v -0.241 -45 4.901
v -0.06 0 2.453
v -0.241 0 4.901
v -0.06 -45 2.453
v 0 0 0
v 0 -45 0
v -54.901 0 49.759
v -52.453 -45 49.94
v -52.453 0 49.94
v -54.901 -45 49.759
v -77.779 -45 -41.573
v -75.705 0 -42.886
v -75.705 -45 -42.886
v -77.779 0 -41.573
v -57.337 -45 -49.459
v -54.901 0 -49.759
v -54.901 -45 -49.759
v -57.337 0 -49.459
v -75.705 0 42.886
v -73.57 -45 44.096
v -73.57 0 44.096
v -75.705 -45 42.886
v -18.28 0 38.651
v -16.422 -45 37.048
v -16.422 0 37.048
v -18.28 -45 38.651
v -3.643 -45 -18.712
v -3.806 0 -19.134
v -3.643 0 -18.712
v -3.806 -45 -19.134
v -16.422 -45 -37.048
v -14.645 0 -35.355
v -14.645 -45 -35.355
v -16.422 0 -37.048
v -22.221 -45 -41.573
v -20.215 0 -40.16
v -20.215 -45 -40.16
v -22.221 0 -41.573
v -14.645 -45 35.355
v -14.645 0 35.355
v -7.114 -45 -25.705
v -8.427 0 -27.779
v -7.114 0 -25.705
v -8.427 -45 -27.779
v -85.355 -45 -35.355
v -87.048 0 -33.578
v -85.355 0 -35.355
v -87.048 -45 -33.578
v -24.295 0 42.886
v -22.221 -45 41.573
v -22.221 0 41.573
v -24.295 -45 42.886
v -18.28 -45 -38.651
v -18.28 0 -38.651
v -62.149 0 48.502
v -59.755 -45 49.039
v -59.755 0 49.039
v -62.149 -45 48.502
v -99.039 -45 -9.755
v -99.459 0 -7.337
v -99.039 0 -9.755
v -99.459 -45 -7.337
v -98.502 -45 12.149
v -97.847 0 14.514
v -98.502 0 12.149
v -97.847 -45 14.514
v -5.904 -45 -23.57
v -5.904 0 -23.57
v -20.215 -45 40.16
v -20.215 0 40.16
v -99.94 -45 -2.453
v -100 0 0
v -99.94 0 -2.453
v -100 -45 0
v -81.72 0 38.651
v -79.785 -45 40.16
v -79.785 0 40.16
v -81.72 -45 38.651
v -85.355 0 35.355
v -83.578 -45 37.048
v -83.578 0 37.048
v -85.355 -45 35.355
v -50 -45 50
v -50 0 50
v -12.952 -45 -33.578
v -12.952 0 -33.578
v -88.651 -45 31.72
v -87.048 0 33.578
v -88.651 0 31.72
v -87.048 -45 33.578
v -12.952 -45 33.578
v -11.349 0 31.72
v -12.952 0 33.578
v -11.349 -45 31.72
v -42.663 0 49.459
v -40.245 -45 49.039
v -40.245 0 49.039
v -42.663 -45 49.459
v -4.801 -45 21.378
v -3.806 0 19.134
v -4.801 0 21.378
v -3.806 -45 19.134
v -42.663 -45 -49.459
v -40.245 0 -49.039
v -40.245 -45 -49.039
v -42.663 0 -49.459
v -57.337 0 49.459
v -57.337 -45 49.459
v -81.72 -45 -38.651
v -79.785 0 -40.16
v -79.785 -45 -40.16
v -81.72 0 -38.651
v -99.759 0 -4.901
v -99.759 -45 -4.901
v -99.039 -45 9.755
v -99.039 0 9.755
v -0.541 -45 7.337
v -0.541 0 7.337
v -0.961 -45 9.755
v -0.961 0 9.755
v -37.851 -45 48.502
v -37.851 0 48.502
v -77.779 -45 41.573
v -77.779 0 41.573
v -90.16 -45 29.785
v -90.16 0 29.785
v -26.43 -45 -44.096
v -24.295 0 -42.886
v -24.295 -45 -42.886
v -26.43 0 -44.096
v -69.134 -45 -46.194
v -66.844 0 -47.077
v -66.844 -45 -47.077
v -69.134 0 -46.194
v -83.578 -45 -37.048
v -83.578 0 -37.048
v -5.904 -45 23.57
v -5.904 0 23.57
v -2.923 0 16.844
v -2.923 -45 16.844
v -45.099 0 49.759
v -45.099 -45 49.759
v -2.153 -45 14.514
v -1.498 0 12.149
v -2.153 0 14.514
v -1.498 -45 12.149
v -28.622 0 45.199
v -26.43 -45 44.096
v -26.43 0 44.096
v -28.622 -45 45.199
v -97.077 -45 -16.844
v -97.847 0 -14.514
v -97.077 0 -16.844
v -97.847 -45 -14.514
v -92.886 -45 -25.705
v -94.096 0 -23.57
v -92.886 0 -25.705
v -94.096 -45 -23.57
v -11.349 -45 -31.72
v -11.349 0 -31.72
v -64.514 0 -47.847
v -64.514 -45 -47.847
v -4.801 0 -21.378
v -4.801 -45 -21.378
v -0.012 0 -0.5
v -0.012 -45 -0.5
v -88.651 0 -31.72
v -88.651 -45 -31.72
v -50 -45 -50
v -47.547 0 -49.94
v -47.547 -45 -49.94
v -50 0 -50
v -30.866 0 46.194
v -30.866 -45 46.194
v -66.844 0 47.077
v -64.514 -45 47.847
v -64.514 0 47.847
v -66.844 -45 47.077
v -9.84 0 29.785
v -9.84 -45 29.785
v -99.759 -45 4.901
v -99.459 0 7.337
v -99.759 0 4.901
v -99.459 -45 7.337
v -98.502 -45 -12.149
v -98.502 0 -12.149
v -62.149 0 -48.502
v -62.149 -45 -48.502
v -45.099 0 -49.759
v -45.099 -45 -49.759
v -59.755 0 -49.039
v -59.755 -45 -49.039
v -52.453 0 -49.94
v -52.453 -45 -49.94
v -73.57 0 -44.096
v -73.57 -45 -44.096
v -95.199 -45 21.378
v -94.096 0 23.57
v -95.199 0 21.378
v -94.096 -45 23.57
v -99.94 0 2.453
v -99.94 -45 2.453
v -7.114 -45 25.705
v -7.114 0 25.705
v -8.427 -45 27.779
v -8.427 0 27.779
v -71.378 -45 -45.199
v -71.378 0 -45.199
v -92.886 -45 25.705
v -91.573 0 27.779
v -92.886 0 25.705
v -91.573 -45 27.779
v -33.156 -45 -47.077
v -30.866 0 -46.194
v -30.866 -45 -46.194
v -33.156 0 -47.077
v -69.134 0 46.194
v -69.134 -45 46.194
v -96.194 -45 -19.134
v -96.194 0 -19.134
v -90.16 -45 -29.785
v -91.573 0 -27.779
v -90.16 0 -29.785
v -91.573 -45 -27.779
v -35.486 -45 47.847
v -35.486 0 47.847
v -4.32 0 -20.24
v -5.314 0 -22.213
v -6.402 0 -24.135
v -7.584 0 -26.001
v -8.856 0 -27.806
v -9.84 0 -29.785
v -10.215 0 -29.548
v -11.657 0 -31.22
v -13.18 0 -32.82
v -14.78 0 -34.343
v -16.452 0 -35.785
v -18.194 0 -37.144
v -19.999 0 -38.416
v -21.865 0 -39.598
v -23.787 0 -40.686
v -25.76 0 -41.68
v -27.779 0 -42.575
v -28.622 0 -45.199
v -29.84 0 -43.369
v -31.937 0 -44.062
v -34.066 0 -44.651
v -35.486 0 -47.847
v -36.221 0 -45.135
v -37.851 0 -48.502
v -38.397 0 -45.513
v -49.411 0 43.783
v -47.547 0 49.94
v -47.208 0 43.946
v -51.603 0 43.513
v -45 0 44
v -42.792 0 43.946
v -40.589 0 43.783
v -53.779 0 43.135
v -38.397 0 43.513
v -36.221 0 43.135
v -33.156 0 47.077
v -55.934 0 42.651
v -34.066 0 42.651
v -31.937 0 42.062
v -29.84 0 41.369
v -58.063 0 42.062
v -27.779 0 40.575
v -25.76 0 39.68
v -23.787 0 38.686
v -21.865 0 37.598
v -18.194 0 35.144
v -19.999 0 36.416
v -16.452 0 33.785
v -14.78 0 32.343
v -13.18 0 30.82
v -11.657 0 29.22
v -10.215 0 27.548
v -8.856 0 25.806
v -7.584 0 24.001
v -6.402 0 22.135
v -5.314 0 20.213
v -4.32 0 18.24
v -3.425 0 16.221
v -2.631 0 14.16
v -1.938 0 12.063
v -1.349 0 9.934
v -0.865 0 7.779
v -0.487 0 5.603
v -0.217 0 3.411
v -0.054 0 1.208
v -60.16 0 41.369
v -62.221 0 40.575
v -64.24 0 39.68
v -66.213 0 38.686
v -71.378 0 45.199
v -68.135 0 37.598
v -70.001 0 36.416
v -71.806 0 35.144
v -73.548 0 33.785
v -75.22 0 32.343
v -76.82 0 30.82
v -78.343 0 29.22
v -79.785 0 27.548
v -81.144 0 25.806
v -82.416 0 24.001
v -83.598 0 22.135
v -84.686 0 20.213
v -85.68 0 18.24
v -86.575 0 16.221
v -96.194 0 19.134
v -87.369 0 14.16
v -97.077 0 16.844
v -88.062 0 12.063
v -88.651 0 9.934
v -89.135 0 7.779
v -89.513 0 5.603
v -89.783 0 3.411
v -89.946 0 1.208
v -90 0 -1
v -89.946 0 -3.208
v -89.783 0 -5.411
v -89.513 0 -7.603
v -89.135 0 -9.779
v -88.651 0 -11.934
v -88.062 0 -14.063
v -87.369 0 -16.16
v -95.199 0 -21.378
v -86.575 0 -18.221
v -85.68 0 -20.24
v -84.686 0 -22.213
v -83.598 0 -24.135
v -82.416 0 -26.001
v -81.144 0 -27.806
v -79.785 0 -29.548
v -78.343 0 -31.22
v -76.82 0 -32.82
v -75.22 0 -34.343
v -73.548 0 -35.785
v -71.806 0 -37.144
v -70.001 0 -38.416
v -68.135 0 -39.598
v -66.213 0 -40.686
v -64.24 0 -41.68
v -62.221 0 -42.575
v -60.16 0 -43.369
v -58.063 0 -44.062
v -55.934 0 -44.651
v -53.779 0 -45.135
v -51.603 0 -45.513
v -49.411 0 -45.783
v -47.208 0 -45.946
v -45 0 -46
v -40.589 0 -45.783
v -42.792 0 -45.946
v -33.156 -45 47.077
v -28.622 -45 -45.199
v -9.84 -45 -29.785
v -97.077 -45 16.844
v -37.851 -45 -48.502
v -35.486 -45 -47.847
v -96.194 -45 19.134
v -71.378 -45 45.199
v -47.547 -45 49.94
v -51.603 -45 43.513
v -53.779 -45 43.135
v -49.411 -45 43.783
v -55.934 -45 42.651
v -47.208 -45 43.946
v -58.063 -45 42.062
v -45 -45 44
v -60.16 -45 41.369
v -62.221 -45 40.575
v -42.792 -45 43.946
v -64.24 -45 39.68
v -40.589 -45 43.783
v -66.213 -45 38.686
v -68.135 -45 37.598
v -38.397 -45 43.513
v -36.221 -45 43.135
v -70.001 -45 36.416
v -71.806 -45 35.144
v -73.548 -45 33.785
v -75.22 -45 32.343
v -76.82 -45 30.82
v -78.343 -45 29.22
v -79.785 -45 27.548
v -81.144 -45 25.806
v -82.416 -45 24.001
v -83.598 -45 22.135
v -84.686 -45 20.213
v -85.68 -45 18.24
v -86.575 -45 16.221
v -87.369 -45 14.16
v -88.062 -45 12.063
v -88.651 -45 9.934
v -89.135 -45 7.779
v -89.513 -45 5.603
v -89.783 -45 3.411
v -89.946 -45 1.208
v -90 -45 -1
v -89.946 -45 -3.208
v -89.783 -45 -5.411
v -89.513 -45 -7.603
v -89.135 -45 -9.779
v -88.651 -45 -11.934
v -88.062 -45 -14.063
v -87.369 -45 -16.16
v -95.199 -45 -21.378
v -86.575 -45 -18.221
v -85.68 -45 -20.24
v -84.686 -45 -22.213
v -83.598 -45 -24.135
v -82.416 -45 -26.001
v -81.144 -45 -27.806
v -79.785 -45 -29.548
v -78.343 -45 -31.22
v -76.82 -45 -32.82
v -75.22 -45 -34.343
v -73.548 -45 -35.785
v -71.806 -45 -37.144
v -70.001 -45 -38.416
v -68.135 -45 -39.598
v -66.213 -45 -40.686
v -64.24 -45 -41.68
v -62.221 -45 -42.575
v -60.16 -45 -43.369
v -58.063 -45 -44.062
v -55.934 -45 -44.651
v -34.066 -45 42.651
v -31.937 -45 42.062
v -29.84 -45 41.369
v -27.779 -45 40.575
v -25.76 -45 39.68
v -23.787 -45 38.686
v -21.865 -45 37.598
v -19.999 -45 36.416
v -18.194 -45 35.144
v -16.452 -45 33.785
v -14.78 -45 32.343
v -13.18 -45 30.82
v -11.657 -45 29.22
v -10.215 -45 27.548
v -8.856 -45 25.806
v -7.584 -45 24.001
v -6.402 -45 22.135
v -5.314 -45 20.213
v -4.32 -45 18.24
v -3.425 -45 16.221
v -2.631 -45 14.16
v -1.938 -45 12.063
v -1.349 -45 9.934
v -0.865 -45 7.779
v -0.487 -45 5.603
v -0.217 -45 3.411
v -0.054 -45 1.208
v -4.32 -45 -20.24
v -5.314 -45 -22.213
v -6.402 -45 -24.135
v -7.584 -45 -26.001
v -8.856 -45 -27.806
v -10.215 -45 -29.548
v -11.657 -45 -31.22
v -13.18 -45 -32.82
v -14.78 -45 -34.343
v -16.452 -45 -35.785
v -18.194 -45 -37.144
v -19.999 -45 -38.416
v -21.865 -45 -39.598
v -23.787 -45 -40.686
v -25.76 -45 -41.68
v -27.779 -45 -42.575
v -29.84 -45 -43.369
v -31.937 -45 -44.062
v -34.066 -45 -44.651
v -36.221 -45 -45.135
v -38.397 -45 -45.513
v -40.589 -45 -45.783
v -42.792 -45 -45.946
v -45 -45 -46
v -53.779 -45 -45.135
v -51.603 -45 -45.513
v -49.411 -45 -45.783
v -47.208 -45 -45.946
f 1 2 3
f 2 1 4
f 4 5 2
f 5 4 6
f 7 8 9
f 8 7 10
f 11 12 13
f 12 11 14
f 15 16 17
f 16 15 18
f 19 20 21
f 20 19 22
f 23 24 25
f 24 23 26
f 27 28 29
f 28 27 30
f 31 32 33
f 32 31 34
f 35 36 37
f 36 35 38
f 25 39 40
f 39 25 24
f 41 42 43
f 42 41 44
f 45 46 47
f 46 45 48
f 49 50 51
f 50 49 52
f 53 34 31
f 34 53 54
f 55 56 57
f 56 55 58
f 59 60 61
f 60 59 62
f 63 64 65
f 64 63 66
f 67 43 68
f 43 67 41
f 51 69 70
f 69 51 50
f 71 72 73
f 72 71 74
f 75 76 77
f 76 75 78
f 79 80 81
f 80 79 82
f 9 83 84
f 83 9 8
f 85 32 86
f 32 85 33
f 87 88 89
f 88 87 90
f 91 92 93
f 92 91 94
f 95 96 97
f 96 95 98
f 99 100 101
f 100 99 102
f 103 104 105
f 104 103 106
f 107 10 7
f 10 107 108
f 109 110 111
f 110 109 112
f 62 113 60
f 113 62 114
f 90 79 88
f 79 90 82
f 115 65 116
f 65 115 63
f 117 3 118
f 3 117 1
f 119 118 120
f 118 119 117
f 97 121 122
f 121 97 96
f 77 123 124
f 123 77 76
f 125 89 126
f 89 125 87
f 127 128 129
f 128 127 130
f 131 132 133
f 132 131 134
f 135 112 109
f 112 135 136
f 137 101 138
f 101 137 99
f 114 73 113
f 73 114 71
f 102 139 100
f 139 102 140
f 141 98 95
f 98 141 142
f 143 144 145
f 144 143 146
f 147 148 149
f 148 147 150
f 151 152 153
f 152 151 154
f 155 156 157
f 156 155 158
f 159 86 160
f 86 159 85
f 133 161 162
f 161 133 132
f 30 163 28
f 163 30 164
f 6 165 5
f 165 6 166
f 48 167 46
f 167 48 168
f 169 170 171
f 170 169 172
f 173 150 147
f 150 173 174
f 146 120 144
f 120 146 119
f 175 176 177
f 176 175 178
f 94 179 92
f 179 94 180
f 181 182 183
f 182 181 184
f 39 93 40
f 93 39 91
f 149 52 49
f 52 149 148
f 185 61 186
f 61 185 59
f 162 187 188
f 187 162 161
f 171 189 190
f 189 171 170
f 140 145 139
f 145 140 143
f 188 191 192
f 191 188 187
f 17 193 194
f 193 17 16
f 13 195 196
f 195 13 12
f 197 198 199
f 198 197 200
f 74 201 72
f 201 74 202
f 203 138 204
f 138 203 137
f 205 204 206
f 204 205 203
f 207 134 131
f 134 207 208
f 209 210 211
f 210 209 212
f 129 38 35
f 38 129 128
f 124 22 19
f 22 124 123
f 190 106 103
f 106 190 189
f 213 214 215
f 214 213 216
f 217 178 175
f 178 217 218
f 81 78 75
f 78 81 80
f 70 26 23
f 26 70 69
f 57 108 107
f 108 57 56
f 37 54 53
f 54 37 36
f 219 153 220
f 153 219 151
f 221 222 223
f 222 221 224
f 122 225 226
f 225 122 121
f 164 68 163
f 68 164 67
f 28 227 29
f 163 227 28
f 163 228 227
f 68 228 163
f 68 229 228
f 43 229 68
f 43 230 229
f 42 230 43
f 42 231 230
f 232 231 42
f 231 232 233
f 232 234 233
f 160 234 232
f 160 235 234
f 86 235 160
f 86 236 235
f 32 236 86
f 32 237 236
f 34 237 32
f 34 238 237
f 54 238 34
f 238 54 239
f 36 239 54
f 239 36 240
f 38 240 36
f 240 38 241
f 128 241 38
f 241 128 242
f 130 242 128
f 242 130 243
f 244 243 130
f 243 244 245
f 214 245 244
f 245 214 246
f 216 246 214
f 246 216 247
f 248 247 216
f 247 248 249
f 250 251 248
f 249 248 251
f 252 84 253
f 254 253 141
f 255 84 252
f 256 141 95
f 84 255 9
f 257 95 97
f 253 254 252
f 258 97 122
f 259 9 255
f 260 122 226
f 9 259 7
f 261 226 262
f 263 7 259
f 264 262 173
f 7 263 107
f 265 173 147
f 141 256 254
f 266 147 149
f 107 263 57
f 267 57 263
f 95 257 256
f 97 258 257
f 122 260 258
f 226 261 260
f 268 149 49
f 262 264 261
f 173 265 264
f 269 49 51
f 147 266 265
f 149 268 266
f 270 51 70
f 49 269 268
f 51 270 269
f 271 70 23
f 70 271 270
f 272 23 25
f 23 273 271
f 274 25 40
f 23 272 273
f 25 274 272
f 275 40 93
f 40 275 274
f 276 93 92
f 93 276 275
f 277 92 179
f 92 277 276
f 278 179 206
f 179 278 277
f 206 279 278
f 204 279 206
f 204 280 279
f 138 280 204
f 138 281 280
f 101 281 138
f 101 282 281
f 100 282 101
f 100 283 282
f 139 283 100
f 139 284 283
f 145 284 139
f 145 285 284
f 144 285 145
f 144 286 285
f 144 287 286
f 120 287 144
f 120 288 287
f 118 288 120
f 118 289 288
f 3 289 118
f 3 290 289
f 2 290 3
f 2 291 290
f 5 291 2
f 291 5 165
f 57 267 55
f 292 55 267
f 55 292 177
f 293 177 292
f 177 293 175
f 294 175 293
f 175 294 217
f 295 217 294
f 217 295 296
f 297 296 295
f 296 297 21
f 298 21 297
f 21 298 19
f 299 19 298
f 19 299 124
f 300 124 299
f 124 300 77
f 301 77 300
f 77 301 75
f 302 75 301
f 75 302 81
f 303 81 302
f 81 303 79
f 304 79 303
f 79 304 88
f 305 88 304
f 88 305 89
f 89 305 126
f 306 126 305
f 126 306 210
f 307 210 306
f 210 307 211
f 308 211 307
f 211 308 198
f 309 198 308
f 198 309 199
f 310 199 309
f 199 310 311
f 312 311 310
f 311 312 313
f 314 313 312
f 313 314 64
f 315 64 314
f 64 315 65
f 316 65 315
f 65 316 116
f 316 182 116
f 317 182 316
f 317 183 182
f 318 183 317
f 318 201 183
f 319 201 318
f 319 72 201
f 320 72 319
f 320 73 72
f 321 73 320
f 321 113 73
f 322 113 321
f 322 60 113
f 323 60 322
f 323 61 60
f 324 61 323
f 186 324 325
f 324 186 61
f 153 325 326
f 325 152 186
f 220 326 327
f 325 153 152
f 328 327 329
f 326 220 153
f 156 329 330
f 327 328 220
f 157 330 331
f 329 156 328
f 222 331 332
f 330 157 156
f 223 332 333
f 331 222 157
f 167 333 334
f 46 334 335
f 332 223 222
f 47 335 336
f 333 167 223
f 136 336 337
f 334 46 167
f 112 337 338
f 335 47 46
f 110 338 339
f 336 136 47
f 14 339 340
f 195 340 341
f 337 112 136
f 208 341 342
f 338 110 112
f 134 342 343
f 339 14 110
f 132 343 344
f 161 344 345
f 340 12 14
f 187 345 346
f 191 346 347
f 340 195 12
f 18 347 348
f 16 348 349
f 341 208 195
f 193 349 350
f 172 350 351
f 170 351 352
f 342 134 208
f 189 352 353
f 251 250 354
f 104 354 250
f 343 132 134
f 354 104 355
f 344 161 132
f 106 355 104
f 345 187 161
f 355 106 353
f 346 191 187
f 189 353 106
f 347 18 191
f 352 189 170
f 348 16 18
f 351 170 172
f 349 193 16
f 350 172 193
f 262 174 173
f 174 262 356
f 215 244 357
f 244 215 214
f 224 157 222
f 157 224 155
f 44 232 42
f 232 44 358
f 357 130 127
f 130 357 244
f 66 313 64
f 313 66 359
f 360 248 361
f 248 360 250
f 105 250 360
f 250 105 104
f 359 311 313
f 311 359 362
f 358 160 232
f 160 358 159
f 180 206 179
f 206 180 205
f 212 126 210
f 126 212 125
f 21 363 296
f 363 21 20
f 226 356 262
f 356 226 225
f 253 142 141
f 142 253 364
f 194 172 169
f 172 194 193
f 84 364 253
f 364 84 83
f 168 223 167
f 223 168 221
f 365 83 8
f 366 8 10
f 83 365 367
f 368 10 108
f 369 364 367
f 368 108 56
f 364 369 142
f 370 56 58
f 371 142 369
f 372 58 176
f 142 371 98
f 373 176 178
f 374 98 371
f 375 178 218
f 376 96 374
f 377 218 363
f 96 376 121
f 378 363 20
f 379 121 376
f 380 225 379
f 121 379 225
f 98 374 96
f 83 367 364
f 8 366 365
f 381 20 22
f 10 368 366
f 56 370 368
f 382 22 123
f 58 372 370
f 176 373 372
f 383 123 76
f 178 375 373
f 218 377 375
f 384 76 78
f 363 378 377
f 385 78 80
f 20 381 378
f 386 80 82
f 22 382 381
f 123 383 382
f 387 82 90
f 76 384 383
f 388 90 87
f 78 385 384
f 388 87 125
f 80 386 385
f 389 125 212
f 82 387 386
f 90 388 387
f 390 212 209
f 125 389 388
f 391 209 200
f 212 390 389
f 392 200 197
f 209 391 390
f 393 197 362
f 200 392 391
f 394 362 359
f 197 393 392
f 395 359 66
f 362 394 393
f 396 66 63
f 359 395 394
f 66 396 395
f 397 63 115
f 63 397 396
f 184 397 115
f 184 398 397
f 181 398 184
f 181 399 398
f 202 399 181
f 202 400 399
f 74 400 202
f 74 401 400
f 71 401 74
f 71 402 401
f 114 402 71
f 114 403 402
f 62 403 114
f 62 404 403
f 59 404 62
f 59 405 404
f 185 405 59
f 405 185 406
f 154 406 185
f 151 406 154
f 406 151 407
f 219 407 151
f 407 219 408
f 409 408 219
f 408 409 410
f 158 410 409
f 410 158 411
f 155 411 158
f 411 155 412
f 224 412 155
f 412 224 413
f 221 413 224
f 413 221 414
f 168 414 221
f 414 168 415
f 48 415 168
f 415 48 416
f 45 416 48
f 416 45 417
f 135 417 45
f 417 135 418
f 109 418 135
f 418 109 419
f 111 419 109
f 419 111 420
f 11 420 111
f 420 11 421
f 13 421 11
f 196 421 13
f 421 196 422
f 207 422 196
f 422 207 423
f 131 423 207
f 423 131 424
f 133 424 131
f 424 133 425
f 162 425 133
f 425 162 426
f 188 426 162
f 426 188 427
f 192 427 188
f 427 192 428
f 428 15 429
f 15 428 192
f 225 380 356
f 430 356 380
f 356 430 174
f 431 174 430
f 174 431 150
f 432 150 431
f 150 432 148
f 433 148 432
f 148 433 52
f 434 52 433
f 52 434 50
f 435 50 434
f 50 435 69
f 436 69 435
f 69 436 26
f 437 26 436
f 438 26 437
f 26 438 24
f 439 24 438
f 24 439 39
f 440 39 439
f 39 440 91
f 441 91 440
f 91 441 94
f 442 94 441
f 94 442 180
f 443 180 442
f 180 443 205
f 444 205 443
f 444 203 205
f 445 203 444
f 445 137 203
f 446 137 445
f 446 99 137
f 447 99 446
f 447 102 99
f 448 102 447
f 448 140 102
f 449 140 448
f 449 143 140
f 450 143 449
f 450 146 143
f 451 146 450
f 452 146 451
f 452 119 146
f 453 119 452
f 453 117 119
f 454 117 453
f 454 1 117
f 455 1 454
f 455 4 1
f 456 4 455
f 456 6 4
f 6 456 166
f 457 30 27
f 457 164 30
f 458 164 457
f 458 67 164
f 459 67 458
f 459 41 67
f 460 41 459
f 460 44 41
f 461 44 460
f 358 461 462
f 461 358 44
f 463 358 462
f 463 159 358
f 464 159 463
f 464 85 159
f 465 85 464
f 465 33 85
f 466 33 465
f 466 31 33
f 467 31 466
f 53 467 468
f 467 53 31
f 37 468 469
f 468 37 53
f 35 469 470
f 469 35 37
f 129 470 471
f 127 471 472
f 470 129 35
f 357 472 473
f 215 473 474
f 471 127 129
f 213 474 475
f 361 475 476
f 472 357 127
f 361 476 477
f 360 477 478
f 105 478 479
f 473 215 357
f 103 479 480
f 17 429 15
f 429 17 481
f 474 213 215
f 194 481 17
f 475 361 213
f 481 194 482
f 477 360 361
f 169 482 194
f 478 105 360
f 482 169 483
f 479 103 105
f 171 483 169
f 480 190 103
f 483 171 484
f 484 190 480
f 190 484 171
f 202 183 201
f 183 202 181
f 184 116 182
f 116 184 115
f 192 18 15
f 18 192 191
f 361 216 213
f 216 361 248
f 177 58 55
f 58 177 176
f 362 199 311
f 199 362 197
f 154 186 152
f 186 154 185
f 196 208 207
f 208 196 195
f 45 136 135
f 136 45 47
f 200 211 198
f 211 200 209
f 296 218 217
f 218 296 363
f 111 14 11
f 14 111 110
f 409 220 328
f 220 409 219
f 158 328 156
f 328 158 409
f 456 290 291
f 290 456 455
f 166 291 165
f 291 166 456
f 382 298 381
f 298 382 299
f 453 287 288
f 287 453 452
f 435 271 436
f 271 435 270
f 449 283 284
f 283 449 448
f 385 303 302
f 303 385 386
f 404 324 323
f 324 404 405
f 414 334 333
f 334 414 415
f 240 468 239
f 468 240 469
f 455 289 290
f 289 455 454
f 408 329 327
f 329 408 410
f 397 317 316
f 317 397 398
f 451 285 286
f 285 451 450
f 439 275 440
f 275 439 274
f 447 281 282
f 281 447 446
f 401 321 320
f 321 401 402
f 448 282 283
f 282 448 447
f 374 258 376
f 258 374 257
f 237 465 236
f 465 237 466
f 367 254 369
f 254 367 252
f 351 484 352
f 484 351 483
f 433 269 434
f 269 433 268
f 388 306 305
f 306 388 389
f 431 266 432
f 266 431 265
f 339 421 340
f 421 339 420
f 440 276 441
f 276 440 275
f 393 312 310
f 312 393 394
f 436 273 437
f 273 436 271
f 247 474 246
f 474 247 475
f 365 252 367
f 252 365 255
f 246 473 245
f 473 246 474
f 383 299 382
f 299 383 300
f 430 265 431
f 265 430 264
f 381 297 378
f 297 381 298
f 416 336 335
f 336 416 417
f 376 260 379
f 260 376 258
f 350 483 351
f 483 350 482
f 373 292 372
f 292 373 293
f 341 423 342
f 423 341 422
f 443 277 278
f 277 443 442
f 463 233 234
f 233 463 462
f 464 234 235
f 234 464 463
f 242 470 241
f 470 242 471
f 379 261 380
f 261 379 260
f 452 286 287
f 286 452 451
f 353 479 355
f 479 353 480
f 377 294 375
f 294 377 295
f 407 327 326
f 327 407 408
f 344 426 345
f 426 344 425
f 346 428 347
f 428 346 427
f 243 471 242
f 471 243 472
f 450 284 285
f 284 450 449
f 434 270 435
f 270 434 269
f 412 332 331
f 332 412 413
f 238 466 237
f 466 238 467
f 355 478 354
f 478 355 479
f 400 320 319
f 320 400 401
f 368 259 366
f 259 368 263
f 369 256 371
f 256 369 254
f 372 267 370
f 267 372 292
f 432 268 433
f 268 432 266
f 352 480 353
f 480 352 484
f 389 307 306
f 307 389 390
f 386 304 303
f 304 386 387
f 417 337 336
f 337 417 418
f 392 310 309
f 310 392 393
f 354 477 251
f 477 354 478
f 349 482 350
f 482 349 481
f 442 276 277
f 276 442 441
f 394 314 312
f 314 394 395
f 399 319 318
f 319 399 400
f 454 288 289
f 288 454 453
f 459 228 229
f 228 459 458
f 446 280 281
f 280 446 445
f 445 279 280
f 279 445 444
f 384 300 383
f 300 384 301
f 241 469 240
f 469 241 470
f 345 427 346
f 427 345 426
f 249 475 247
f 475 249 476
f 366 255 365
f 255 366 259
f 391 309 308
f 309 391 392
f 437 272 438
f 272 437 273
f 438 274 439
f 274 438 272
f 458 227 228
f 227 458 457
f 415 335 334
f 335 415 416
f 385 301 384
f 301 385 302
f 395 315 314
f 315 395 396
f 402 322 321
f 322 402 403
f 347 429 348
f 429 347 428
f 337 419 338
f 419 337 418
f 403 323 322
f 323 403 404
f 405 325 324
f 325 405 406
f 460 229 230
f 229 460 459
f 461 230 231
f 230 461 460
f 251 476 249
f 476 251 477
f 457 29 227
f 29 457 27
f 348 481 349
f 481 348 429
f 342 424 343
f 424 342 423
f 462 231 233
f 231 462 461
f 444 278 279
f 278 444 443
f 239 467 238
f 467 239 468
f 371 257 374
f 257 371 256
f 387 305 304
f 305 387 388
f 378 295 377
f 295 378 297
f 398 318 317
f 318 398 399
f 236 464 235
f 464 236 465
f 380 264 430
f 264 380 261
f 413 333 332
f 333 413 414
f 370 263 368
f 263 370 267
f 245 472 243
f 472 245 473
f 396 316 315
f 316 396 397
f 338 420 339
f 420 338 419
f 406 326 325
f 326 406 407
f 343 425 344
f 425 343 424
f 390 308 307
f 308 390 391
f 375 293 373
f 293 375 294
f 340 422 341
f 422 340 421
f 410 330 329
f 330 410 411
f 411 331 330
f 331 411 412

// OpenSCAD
outer_r=50; inner_r=45; h=45; shaft_clear=8;
module chamber(){ difference(){ translate([-outer_r,0,0]) rotate([90,0,0]) cylinder(h=h,r=outer_r,$fn=128); translate([-inner_r,0,-1]) rotate([90,0,0]) cylinder(h=h+2,r=inner_r,$fn=128); } }
chamber();
